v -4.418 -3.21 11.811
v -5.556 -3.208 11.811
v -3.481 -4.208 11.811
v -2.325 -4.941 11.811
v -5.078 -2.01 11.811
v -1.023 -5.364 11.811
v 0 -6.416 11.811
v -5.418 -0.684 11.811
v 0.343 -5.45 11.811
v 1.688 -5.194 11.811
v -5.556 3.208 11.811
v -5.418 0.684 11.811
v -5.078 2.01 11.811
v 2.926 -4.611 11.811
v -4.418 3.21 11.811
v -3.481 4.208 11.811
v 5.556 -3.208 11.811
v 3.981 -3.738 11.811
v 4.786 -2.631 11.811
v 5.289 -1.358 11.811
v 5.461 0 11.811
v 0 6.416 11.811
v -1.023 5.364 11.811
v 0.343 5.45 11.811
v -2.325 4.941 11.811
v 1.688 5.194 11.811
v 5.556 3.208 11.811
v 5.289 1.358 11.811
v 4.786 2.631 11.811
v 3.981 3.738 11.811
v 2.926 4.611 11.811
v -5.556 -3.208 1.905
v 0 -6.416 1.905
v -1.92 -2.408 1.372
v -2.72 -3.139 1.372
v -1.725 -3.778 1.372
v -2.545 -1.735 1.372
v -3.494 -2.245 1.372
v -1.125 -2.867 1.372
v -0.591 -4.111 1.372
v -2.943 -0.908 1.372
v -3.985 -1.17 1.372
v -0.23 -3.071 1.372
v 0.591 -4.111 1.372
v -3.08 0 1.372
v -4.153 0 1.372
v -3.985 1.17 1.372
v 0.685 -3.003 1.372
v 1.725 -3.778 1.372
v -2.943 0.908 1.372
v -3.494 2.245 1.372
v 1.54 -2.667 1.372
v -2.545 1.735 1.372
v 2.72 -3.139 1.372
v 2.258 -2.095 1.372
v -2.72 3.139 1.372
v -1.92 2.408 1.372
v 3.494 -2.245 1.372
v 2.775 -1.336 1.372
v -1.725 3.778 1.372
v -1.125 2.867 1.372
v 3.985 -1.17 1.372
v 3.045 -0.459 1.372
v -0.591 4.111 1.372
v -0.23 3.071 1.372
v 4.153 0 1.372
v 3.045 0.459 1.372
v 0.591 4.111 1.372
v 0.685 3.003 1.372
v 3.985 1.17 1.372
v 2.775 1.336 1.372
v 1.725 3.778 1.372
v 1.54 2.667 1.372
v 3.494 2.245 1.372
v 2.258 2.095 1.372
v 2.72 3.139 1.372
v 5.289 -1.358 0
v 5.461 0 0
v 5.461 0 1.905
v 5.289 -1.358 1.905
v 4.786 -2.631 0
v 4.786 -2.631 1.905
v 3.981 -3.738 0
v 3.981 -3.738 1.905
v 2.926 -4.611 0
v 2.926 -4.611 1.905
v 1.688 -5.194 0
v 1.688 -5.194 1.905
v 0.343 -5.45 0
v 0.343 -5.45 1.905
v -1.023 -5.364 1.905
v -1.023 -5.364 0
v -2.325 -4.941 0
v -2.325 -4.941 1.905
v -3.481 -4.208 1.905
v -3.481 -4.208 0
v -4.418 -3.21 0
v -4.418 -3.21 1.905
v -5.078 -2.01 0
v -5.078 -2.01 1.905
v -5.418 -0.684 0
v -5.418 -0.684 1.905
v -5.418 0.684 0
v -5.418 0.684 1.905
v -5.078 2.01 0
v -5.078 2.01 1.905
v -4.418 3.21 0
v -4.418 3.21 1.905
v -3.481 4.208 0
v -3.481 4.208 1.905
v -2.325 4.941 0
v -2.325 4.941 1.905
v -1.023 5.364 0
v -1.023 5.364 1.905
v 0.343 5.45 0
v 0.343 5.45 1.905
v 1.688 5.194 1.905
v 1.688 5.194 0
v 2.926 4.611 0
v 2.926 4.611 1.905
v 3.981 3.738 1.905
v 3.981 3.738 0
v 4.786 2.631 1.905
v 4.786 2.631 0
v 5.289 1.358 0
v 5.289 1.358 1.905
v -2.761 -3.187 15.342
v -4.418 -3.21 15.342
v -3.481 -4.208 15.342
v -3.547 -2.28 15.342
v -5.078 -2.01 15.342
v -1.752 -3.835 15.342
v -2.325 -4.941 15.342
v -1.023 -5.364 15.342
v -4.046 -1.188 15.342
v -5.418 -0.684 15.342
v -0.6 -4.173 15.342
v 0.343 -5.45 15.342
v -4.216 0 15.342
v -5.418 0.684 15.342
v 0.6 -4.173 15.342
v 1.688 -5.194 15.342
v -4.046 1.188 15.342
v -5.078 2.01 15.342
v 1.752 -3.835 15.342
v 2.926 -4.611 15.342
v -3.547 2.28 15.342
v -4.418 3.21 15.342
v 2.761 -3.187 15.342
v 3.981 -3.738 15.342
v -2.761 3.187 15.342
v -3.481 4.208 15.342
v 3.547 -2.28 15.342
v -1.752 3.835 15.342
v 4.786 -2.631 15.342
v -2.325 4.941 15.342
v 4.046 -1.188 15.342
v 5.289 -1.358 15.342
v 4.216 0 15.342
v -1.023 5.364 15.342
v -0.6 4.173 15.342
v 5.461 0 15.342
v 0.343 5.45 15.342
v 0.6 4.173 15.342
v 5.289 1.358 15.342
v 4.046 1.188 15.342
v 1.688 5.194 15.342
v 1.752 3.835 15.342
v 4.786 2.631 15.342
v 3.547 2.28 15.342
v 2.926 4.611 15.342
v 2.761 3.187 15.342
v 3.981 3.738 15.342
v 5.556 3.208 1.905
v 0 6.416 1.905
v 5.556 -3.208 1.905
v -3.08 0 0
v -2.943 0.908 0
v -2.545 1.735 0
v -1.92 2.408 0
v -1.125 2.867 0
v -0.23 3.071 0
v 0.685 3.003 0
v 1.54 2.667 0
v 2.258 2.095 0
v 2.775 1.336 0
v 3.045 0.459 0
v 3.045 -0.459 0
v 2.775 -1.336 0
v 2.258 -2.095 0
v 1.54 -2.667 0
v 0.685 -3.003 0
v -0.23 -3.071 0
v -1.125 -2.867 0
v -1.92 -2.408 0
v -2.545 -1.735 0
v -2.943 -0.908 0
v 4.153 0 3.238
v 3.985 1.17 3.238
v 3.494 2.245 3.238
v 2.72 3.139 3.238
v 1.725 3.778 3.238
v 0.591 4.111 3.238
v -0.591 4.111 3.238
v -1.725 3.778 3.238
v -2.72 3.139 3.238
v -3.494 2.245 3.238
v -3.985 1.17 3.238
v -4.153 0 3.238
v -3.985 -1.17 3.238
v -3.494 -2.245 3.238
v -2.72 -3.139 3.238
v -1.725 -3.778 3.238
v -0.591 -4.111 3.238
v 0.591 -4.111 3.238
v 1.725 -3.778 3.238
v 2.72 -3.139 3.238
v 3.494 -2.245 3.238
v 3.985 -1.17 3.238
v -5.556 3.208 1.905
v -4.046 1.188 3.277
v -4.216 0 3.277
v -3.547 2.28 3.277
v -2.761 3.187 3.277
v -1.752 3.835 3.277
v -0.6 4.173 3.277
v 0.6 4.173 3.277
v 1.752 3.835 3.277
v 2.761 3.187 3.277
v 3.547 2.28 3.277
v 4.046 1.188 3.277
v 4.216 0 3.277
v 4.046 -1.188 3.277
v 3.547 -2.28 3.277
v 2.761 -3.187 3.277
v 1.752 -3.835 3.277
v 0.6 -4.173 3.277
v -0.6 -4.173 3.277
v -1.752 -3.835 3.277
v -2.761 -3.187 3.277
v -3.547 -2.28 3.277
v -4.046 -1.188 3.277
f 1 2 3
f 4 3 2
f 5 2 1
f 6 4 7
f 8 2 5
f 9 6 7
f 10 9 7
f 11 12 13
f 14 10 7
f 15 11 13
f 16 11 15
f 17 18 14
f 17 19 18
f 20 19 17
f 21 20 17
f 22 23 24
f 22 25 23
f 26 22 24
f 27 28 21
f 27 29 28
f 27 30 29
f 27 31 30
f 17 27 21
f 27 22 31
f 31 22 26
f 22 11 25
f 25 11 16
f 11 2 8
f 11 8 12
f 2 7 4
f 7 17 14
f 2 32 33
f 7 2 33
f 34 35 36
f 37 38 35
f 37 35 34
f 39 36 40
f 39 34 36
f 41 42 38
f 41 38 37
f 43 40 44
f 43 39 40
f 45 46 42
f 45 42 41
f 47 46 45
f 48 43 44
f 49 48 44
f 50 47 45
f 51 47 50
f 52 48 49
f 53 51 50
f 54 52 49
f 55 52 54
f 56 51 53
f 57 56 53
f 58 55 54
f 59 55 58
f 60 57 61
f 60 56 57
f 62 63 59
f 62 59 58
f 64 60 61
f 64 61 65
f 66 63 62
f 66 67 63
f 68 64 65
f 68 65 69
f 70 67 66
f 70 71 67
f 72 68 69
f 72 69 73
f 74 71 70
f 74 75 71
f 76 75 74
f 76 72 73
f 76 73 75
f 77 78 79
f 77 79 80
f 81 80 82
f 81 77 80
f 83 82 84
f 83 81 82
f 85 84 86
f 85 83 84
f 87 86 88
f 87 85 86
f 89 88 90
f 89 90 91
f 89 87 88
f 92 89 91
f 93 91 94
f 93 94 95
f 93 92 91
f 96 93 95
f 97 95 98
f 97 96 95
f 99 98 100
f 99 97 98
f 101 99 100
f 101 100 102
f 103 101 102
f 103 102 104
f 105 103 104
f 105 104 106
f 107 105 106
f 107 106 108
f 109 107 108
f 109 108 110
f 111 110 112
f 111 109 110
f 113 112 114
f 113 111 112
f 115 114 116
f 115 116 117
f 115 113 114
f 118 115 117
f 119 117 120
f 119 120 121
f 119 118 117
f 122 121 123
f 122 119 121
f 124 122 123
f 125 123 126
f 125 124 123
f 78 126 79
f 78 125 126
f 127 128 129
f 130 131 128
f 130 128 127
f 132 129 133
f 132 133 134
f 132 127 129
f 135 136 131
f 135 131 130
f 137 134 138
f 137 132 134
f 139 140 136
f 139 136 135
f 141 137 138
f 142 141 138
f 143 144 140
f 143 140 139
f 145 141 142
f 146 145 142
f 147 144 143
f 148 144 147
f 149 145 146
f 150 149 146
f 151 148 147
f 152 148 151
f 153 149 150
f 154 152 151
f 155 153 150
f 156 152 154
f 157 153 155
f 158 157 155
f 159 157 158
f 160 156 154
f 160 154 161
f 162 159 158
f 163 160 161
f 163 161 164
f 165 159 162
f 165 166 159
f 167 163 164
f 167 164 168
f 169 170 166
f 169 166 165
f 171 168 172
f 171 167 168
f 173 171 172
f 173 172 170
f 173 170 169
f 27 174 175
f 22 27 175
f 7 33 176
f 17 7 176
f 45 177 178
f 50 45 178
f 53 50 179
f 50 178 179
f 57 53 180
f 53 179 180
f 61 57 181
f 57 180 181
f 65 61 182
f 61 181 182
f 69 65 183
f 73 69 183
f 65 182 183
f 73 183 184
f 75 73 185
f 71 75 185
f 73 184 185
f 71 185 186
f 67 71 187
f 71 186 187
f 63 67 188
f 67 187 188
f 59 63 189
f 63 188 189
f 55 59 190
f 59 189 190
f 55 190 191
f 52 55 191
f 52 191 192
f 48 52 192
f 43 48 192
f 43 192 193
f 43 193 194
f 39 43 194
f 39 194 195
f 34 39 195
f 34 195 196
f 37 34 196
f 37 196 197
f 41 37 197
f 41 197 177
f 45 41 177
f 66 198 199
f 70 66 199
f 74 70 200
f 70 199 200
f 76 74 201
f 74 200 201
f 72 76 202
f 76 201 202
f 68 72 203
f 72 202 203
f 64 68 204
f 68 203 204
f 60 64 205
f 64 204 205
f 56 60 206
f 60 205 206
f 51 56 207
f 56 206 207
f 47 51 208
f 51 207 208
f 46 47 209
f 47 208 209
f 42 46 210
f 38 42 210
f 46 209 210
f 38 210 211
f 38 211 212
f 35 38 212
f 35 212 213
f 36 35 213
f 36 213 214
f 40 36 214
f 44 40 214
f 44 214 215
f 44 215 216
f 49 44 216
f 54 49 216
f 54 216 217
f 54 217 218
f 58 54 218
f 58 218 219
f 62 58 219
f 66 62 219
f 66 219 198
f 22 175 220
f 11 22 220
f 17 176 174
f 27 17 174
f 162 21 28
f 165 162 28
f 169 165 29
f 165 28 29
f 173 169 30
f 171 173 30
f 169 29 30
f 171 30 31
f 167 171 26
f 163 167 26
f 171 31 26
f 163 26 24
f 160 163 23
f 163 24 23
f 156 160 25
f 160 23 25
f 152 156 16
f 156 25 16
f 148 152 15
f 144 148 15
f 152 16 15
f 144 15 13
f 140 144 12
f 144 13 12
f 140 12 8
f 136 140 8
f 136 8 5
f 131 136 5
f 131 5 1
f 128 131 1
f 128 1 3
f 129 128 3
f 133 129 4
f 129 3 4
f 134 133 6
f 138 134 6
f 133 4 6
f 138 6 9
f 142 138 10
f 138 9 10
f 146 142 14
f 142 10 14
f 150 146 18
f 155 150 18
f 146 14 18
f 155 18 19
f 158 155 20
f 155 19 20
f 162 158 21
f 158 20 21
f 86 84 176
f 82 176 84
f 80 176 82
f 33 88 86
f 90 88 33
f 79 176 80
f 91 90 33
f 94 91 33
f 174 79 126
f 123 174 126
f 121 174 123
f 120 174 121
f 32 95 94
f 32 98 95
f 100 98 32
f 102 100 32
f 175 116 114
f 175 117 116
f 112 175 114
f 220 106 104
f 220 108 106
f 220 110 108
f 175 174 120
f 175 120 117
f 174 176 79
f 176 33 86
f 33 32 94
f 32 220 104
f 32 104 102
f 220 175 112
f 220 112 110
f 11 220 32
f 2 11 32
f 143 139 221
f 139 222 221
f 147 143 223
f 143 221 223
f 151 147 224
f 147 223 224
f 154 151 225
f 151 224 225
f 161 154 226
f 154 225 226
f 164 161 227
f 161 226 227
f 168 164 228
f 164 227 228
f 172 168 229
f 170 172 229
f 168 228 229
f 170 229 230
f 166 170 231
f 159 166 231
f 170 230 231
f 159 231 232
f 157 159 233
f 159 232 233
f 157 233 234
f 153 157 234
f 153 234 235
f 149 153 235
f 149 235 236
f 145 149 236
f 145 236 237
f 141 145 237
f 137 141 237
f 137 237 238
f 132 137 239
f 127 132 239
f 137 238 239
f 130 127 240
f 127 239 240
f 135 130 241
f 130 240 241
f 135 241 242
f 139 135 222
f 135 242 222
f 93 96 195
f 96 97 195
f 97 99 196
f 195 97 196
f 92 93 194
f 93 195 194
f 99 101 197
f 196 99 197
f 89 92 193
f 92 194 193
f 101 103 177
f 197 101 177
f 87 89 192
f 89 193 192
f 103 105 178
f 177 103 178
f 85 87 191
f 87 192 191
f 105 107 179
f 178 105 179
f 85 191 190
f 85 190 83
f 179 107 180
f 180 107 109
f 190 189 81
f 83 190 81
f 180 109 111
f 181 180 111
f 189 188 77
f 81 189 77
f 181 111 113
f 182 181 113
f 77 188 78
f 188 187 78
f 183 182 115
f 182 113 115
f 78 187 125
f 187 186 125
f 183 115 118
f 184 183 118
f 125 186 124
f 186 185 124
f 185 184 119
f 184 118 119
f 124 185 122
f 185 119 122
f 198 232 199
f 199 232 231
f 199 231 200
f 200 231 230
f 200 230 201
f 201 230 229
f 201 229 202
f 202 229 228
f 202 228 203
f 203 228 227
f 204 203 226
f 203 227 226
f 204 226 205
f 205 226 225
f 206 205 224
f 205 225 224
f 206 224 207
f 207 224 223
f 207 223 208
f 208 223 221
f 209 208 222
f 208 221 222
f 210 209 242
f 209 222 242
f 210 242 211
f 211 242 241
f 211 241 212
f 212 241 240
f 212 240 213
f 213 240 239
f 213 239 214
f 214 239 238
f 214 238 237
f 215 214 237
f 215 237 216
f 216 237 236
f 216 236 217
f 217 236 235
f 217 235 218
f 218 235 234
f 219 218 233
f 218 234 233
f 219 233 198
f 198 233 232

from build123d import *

# Parameters (mm, degrees)
BOSS_EXTRUDE1_DEPTH         = 11.811
SKETCH5_R                   = 5.461
BOSS_EXTRUDE3_DEPTH         = 3.5306
F_3_8_24_TAPPED_HOLE2_D     = 8.4328
F_3_8_24_TAPPED_HOLE2_DEPTH = 12.065
F_3_8_24_TAPPED_HOLE2_TIP   = 2.533468714
SKETCH9_R                   = 3.07975
CUT_EXTRUDE1_DEPTH          = 16.3416
SKETCH10_R                  = 4.1529
CUT_EXTRUDE2_DEPTH          = 4.445
SKETCH11_OUTSIDE_W          = 17.688
SKETCH11_OUTSIDE_H          = 19.408
SKETCH11_OUTSIDE_R          = 5.461
CUT_EXTRUDE3_DEPTH          = 1.905


with BuildPart() as part:
    # Sketch1 → Boss-Extrude1 (new body)
    with BuildSketch(Plane.XY):
        Polygon((5.55625, -3.207902433), (5.55625, 3.207902433), (0, 6.415804866), (-5.55625, 3.207902433), (-5.55625, -3.207902433), (0, -6.415804866), align=None)
    extrude(amount=BOSS_EXTRUDE1_DEPTH)

    # Sketch5 → Boss-Extrude3 (add)
    with BuildSketch(Plane.XY.offset(11.811)):
        Circle(SKETCH5_R)
    extrude(amount=BOSS_EXTRUDE3_DEPTH)

    # 3/8-24 Tapped Hole2
    with Locations(Plane.XY.offset(15.3416)):
        with Locations((0, 0)):
            Hole(F_3_8_24_TAPPED_HOLE2_D / 2, depth=F_3_8_24_TAPPED_HOLE2_DEPTH)
            with Locations((0, 0, -(F_3_8_24_TAPPED_HOLE2_DEPTH + F_3_8_24_TAPPED_HOLE2_TIP / 2))):  # 118° drill point
                Cone(0, F_3_8_24_TAPPED_HOLE2_D / 2, F_3_8_24_TAPPED_HOLE2_TIP, mode=Mode.SUBTRACT)

    # Sketch9 → Cut-Extrude1 (cut, through all)
    with BuildSketch(Plane(origin=(0, 0, 0), x_dir=(-1, 0, 0), z_dir=(0, 0, -1))):
        Circle(SKETCH9_R)
    extrude(amount=-CUT_EXTRUDE1_DEPTH, mode=Mode.SUBTRACT)

    # Sketch10 → Cut-Extrude2 (cut)
    with BuildSketch(Plane.XY.offset(5.8166)):
        Circle(SKETCH10_R)
    extrude(amount=-CUT_EXTRUDE2_DEPTH, mode=Mode.SUBTRACT)

    # Sketch11 outside → Cut-Extrude3 (cut)
    with BuildSketch(Plane(origin=(0, 0, 0), x_dir=(-1, 0, 0), z_dir=(0, 0, -1))):
        Rectangle(SKETCH11_OUTSIDE_W, SKETCH11_OUTSIDE_H)
        with Locations(Location((0, 0, 0), (0, 0, 180))):  # turned: the seam where the file's is
            Circle(SKETCH11_OUTSIDE_R, mode=Mode.SUBTRACT)
    extrude(amount=-CUT_EXTRUDE3_DEPTH, mode=Mode.SUBTRACT)


solid = part.part
